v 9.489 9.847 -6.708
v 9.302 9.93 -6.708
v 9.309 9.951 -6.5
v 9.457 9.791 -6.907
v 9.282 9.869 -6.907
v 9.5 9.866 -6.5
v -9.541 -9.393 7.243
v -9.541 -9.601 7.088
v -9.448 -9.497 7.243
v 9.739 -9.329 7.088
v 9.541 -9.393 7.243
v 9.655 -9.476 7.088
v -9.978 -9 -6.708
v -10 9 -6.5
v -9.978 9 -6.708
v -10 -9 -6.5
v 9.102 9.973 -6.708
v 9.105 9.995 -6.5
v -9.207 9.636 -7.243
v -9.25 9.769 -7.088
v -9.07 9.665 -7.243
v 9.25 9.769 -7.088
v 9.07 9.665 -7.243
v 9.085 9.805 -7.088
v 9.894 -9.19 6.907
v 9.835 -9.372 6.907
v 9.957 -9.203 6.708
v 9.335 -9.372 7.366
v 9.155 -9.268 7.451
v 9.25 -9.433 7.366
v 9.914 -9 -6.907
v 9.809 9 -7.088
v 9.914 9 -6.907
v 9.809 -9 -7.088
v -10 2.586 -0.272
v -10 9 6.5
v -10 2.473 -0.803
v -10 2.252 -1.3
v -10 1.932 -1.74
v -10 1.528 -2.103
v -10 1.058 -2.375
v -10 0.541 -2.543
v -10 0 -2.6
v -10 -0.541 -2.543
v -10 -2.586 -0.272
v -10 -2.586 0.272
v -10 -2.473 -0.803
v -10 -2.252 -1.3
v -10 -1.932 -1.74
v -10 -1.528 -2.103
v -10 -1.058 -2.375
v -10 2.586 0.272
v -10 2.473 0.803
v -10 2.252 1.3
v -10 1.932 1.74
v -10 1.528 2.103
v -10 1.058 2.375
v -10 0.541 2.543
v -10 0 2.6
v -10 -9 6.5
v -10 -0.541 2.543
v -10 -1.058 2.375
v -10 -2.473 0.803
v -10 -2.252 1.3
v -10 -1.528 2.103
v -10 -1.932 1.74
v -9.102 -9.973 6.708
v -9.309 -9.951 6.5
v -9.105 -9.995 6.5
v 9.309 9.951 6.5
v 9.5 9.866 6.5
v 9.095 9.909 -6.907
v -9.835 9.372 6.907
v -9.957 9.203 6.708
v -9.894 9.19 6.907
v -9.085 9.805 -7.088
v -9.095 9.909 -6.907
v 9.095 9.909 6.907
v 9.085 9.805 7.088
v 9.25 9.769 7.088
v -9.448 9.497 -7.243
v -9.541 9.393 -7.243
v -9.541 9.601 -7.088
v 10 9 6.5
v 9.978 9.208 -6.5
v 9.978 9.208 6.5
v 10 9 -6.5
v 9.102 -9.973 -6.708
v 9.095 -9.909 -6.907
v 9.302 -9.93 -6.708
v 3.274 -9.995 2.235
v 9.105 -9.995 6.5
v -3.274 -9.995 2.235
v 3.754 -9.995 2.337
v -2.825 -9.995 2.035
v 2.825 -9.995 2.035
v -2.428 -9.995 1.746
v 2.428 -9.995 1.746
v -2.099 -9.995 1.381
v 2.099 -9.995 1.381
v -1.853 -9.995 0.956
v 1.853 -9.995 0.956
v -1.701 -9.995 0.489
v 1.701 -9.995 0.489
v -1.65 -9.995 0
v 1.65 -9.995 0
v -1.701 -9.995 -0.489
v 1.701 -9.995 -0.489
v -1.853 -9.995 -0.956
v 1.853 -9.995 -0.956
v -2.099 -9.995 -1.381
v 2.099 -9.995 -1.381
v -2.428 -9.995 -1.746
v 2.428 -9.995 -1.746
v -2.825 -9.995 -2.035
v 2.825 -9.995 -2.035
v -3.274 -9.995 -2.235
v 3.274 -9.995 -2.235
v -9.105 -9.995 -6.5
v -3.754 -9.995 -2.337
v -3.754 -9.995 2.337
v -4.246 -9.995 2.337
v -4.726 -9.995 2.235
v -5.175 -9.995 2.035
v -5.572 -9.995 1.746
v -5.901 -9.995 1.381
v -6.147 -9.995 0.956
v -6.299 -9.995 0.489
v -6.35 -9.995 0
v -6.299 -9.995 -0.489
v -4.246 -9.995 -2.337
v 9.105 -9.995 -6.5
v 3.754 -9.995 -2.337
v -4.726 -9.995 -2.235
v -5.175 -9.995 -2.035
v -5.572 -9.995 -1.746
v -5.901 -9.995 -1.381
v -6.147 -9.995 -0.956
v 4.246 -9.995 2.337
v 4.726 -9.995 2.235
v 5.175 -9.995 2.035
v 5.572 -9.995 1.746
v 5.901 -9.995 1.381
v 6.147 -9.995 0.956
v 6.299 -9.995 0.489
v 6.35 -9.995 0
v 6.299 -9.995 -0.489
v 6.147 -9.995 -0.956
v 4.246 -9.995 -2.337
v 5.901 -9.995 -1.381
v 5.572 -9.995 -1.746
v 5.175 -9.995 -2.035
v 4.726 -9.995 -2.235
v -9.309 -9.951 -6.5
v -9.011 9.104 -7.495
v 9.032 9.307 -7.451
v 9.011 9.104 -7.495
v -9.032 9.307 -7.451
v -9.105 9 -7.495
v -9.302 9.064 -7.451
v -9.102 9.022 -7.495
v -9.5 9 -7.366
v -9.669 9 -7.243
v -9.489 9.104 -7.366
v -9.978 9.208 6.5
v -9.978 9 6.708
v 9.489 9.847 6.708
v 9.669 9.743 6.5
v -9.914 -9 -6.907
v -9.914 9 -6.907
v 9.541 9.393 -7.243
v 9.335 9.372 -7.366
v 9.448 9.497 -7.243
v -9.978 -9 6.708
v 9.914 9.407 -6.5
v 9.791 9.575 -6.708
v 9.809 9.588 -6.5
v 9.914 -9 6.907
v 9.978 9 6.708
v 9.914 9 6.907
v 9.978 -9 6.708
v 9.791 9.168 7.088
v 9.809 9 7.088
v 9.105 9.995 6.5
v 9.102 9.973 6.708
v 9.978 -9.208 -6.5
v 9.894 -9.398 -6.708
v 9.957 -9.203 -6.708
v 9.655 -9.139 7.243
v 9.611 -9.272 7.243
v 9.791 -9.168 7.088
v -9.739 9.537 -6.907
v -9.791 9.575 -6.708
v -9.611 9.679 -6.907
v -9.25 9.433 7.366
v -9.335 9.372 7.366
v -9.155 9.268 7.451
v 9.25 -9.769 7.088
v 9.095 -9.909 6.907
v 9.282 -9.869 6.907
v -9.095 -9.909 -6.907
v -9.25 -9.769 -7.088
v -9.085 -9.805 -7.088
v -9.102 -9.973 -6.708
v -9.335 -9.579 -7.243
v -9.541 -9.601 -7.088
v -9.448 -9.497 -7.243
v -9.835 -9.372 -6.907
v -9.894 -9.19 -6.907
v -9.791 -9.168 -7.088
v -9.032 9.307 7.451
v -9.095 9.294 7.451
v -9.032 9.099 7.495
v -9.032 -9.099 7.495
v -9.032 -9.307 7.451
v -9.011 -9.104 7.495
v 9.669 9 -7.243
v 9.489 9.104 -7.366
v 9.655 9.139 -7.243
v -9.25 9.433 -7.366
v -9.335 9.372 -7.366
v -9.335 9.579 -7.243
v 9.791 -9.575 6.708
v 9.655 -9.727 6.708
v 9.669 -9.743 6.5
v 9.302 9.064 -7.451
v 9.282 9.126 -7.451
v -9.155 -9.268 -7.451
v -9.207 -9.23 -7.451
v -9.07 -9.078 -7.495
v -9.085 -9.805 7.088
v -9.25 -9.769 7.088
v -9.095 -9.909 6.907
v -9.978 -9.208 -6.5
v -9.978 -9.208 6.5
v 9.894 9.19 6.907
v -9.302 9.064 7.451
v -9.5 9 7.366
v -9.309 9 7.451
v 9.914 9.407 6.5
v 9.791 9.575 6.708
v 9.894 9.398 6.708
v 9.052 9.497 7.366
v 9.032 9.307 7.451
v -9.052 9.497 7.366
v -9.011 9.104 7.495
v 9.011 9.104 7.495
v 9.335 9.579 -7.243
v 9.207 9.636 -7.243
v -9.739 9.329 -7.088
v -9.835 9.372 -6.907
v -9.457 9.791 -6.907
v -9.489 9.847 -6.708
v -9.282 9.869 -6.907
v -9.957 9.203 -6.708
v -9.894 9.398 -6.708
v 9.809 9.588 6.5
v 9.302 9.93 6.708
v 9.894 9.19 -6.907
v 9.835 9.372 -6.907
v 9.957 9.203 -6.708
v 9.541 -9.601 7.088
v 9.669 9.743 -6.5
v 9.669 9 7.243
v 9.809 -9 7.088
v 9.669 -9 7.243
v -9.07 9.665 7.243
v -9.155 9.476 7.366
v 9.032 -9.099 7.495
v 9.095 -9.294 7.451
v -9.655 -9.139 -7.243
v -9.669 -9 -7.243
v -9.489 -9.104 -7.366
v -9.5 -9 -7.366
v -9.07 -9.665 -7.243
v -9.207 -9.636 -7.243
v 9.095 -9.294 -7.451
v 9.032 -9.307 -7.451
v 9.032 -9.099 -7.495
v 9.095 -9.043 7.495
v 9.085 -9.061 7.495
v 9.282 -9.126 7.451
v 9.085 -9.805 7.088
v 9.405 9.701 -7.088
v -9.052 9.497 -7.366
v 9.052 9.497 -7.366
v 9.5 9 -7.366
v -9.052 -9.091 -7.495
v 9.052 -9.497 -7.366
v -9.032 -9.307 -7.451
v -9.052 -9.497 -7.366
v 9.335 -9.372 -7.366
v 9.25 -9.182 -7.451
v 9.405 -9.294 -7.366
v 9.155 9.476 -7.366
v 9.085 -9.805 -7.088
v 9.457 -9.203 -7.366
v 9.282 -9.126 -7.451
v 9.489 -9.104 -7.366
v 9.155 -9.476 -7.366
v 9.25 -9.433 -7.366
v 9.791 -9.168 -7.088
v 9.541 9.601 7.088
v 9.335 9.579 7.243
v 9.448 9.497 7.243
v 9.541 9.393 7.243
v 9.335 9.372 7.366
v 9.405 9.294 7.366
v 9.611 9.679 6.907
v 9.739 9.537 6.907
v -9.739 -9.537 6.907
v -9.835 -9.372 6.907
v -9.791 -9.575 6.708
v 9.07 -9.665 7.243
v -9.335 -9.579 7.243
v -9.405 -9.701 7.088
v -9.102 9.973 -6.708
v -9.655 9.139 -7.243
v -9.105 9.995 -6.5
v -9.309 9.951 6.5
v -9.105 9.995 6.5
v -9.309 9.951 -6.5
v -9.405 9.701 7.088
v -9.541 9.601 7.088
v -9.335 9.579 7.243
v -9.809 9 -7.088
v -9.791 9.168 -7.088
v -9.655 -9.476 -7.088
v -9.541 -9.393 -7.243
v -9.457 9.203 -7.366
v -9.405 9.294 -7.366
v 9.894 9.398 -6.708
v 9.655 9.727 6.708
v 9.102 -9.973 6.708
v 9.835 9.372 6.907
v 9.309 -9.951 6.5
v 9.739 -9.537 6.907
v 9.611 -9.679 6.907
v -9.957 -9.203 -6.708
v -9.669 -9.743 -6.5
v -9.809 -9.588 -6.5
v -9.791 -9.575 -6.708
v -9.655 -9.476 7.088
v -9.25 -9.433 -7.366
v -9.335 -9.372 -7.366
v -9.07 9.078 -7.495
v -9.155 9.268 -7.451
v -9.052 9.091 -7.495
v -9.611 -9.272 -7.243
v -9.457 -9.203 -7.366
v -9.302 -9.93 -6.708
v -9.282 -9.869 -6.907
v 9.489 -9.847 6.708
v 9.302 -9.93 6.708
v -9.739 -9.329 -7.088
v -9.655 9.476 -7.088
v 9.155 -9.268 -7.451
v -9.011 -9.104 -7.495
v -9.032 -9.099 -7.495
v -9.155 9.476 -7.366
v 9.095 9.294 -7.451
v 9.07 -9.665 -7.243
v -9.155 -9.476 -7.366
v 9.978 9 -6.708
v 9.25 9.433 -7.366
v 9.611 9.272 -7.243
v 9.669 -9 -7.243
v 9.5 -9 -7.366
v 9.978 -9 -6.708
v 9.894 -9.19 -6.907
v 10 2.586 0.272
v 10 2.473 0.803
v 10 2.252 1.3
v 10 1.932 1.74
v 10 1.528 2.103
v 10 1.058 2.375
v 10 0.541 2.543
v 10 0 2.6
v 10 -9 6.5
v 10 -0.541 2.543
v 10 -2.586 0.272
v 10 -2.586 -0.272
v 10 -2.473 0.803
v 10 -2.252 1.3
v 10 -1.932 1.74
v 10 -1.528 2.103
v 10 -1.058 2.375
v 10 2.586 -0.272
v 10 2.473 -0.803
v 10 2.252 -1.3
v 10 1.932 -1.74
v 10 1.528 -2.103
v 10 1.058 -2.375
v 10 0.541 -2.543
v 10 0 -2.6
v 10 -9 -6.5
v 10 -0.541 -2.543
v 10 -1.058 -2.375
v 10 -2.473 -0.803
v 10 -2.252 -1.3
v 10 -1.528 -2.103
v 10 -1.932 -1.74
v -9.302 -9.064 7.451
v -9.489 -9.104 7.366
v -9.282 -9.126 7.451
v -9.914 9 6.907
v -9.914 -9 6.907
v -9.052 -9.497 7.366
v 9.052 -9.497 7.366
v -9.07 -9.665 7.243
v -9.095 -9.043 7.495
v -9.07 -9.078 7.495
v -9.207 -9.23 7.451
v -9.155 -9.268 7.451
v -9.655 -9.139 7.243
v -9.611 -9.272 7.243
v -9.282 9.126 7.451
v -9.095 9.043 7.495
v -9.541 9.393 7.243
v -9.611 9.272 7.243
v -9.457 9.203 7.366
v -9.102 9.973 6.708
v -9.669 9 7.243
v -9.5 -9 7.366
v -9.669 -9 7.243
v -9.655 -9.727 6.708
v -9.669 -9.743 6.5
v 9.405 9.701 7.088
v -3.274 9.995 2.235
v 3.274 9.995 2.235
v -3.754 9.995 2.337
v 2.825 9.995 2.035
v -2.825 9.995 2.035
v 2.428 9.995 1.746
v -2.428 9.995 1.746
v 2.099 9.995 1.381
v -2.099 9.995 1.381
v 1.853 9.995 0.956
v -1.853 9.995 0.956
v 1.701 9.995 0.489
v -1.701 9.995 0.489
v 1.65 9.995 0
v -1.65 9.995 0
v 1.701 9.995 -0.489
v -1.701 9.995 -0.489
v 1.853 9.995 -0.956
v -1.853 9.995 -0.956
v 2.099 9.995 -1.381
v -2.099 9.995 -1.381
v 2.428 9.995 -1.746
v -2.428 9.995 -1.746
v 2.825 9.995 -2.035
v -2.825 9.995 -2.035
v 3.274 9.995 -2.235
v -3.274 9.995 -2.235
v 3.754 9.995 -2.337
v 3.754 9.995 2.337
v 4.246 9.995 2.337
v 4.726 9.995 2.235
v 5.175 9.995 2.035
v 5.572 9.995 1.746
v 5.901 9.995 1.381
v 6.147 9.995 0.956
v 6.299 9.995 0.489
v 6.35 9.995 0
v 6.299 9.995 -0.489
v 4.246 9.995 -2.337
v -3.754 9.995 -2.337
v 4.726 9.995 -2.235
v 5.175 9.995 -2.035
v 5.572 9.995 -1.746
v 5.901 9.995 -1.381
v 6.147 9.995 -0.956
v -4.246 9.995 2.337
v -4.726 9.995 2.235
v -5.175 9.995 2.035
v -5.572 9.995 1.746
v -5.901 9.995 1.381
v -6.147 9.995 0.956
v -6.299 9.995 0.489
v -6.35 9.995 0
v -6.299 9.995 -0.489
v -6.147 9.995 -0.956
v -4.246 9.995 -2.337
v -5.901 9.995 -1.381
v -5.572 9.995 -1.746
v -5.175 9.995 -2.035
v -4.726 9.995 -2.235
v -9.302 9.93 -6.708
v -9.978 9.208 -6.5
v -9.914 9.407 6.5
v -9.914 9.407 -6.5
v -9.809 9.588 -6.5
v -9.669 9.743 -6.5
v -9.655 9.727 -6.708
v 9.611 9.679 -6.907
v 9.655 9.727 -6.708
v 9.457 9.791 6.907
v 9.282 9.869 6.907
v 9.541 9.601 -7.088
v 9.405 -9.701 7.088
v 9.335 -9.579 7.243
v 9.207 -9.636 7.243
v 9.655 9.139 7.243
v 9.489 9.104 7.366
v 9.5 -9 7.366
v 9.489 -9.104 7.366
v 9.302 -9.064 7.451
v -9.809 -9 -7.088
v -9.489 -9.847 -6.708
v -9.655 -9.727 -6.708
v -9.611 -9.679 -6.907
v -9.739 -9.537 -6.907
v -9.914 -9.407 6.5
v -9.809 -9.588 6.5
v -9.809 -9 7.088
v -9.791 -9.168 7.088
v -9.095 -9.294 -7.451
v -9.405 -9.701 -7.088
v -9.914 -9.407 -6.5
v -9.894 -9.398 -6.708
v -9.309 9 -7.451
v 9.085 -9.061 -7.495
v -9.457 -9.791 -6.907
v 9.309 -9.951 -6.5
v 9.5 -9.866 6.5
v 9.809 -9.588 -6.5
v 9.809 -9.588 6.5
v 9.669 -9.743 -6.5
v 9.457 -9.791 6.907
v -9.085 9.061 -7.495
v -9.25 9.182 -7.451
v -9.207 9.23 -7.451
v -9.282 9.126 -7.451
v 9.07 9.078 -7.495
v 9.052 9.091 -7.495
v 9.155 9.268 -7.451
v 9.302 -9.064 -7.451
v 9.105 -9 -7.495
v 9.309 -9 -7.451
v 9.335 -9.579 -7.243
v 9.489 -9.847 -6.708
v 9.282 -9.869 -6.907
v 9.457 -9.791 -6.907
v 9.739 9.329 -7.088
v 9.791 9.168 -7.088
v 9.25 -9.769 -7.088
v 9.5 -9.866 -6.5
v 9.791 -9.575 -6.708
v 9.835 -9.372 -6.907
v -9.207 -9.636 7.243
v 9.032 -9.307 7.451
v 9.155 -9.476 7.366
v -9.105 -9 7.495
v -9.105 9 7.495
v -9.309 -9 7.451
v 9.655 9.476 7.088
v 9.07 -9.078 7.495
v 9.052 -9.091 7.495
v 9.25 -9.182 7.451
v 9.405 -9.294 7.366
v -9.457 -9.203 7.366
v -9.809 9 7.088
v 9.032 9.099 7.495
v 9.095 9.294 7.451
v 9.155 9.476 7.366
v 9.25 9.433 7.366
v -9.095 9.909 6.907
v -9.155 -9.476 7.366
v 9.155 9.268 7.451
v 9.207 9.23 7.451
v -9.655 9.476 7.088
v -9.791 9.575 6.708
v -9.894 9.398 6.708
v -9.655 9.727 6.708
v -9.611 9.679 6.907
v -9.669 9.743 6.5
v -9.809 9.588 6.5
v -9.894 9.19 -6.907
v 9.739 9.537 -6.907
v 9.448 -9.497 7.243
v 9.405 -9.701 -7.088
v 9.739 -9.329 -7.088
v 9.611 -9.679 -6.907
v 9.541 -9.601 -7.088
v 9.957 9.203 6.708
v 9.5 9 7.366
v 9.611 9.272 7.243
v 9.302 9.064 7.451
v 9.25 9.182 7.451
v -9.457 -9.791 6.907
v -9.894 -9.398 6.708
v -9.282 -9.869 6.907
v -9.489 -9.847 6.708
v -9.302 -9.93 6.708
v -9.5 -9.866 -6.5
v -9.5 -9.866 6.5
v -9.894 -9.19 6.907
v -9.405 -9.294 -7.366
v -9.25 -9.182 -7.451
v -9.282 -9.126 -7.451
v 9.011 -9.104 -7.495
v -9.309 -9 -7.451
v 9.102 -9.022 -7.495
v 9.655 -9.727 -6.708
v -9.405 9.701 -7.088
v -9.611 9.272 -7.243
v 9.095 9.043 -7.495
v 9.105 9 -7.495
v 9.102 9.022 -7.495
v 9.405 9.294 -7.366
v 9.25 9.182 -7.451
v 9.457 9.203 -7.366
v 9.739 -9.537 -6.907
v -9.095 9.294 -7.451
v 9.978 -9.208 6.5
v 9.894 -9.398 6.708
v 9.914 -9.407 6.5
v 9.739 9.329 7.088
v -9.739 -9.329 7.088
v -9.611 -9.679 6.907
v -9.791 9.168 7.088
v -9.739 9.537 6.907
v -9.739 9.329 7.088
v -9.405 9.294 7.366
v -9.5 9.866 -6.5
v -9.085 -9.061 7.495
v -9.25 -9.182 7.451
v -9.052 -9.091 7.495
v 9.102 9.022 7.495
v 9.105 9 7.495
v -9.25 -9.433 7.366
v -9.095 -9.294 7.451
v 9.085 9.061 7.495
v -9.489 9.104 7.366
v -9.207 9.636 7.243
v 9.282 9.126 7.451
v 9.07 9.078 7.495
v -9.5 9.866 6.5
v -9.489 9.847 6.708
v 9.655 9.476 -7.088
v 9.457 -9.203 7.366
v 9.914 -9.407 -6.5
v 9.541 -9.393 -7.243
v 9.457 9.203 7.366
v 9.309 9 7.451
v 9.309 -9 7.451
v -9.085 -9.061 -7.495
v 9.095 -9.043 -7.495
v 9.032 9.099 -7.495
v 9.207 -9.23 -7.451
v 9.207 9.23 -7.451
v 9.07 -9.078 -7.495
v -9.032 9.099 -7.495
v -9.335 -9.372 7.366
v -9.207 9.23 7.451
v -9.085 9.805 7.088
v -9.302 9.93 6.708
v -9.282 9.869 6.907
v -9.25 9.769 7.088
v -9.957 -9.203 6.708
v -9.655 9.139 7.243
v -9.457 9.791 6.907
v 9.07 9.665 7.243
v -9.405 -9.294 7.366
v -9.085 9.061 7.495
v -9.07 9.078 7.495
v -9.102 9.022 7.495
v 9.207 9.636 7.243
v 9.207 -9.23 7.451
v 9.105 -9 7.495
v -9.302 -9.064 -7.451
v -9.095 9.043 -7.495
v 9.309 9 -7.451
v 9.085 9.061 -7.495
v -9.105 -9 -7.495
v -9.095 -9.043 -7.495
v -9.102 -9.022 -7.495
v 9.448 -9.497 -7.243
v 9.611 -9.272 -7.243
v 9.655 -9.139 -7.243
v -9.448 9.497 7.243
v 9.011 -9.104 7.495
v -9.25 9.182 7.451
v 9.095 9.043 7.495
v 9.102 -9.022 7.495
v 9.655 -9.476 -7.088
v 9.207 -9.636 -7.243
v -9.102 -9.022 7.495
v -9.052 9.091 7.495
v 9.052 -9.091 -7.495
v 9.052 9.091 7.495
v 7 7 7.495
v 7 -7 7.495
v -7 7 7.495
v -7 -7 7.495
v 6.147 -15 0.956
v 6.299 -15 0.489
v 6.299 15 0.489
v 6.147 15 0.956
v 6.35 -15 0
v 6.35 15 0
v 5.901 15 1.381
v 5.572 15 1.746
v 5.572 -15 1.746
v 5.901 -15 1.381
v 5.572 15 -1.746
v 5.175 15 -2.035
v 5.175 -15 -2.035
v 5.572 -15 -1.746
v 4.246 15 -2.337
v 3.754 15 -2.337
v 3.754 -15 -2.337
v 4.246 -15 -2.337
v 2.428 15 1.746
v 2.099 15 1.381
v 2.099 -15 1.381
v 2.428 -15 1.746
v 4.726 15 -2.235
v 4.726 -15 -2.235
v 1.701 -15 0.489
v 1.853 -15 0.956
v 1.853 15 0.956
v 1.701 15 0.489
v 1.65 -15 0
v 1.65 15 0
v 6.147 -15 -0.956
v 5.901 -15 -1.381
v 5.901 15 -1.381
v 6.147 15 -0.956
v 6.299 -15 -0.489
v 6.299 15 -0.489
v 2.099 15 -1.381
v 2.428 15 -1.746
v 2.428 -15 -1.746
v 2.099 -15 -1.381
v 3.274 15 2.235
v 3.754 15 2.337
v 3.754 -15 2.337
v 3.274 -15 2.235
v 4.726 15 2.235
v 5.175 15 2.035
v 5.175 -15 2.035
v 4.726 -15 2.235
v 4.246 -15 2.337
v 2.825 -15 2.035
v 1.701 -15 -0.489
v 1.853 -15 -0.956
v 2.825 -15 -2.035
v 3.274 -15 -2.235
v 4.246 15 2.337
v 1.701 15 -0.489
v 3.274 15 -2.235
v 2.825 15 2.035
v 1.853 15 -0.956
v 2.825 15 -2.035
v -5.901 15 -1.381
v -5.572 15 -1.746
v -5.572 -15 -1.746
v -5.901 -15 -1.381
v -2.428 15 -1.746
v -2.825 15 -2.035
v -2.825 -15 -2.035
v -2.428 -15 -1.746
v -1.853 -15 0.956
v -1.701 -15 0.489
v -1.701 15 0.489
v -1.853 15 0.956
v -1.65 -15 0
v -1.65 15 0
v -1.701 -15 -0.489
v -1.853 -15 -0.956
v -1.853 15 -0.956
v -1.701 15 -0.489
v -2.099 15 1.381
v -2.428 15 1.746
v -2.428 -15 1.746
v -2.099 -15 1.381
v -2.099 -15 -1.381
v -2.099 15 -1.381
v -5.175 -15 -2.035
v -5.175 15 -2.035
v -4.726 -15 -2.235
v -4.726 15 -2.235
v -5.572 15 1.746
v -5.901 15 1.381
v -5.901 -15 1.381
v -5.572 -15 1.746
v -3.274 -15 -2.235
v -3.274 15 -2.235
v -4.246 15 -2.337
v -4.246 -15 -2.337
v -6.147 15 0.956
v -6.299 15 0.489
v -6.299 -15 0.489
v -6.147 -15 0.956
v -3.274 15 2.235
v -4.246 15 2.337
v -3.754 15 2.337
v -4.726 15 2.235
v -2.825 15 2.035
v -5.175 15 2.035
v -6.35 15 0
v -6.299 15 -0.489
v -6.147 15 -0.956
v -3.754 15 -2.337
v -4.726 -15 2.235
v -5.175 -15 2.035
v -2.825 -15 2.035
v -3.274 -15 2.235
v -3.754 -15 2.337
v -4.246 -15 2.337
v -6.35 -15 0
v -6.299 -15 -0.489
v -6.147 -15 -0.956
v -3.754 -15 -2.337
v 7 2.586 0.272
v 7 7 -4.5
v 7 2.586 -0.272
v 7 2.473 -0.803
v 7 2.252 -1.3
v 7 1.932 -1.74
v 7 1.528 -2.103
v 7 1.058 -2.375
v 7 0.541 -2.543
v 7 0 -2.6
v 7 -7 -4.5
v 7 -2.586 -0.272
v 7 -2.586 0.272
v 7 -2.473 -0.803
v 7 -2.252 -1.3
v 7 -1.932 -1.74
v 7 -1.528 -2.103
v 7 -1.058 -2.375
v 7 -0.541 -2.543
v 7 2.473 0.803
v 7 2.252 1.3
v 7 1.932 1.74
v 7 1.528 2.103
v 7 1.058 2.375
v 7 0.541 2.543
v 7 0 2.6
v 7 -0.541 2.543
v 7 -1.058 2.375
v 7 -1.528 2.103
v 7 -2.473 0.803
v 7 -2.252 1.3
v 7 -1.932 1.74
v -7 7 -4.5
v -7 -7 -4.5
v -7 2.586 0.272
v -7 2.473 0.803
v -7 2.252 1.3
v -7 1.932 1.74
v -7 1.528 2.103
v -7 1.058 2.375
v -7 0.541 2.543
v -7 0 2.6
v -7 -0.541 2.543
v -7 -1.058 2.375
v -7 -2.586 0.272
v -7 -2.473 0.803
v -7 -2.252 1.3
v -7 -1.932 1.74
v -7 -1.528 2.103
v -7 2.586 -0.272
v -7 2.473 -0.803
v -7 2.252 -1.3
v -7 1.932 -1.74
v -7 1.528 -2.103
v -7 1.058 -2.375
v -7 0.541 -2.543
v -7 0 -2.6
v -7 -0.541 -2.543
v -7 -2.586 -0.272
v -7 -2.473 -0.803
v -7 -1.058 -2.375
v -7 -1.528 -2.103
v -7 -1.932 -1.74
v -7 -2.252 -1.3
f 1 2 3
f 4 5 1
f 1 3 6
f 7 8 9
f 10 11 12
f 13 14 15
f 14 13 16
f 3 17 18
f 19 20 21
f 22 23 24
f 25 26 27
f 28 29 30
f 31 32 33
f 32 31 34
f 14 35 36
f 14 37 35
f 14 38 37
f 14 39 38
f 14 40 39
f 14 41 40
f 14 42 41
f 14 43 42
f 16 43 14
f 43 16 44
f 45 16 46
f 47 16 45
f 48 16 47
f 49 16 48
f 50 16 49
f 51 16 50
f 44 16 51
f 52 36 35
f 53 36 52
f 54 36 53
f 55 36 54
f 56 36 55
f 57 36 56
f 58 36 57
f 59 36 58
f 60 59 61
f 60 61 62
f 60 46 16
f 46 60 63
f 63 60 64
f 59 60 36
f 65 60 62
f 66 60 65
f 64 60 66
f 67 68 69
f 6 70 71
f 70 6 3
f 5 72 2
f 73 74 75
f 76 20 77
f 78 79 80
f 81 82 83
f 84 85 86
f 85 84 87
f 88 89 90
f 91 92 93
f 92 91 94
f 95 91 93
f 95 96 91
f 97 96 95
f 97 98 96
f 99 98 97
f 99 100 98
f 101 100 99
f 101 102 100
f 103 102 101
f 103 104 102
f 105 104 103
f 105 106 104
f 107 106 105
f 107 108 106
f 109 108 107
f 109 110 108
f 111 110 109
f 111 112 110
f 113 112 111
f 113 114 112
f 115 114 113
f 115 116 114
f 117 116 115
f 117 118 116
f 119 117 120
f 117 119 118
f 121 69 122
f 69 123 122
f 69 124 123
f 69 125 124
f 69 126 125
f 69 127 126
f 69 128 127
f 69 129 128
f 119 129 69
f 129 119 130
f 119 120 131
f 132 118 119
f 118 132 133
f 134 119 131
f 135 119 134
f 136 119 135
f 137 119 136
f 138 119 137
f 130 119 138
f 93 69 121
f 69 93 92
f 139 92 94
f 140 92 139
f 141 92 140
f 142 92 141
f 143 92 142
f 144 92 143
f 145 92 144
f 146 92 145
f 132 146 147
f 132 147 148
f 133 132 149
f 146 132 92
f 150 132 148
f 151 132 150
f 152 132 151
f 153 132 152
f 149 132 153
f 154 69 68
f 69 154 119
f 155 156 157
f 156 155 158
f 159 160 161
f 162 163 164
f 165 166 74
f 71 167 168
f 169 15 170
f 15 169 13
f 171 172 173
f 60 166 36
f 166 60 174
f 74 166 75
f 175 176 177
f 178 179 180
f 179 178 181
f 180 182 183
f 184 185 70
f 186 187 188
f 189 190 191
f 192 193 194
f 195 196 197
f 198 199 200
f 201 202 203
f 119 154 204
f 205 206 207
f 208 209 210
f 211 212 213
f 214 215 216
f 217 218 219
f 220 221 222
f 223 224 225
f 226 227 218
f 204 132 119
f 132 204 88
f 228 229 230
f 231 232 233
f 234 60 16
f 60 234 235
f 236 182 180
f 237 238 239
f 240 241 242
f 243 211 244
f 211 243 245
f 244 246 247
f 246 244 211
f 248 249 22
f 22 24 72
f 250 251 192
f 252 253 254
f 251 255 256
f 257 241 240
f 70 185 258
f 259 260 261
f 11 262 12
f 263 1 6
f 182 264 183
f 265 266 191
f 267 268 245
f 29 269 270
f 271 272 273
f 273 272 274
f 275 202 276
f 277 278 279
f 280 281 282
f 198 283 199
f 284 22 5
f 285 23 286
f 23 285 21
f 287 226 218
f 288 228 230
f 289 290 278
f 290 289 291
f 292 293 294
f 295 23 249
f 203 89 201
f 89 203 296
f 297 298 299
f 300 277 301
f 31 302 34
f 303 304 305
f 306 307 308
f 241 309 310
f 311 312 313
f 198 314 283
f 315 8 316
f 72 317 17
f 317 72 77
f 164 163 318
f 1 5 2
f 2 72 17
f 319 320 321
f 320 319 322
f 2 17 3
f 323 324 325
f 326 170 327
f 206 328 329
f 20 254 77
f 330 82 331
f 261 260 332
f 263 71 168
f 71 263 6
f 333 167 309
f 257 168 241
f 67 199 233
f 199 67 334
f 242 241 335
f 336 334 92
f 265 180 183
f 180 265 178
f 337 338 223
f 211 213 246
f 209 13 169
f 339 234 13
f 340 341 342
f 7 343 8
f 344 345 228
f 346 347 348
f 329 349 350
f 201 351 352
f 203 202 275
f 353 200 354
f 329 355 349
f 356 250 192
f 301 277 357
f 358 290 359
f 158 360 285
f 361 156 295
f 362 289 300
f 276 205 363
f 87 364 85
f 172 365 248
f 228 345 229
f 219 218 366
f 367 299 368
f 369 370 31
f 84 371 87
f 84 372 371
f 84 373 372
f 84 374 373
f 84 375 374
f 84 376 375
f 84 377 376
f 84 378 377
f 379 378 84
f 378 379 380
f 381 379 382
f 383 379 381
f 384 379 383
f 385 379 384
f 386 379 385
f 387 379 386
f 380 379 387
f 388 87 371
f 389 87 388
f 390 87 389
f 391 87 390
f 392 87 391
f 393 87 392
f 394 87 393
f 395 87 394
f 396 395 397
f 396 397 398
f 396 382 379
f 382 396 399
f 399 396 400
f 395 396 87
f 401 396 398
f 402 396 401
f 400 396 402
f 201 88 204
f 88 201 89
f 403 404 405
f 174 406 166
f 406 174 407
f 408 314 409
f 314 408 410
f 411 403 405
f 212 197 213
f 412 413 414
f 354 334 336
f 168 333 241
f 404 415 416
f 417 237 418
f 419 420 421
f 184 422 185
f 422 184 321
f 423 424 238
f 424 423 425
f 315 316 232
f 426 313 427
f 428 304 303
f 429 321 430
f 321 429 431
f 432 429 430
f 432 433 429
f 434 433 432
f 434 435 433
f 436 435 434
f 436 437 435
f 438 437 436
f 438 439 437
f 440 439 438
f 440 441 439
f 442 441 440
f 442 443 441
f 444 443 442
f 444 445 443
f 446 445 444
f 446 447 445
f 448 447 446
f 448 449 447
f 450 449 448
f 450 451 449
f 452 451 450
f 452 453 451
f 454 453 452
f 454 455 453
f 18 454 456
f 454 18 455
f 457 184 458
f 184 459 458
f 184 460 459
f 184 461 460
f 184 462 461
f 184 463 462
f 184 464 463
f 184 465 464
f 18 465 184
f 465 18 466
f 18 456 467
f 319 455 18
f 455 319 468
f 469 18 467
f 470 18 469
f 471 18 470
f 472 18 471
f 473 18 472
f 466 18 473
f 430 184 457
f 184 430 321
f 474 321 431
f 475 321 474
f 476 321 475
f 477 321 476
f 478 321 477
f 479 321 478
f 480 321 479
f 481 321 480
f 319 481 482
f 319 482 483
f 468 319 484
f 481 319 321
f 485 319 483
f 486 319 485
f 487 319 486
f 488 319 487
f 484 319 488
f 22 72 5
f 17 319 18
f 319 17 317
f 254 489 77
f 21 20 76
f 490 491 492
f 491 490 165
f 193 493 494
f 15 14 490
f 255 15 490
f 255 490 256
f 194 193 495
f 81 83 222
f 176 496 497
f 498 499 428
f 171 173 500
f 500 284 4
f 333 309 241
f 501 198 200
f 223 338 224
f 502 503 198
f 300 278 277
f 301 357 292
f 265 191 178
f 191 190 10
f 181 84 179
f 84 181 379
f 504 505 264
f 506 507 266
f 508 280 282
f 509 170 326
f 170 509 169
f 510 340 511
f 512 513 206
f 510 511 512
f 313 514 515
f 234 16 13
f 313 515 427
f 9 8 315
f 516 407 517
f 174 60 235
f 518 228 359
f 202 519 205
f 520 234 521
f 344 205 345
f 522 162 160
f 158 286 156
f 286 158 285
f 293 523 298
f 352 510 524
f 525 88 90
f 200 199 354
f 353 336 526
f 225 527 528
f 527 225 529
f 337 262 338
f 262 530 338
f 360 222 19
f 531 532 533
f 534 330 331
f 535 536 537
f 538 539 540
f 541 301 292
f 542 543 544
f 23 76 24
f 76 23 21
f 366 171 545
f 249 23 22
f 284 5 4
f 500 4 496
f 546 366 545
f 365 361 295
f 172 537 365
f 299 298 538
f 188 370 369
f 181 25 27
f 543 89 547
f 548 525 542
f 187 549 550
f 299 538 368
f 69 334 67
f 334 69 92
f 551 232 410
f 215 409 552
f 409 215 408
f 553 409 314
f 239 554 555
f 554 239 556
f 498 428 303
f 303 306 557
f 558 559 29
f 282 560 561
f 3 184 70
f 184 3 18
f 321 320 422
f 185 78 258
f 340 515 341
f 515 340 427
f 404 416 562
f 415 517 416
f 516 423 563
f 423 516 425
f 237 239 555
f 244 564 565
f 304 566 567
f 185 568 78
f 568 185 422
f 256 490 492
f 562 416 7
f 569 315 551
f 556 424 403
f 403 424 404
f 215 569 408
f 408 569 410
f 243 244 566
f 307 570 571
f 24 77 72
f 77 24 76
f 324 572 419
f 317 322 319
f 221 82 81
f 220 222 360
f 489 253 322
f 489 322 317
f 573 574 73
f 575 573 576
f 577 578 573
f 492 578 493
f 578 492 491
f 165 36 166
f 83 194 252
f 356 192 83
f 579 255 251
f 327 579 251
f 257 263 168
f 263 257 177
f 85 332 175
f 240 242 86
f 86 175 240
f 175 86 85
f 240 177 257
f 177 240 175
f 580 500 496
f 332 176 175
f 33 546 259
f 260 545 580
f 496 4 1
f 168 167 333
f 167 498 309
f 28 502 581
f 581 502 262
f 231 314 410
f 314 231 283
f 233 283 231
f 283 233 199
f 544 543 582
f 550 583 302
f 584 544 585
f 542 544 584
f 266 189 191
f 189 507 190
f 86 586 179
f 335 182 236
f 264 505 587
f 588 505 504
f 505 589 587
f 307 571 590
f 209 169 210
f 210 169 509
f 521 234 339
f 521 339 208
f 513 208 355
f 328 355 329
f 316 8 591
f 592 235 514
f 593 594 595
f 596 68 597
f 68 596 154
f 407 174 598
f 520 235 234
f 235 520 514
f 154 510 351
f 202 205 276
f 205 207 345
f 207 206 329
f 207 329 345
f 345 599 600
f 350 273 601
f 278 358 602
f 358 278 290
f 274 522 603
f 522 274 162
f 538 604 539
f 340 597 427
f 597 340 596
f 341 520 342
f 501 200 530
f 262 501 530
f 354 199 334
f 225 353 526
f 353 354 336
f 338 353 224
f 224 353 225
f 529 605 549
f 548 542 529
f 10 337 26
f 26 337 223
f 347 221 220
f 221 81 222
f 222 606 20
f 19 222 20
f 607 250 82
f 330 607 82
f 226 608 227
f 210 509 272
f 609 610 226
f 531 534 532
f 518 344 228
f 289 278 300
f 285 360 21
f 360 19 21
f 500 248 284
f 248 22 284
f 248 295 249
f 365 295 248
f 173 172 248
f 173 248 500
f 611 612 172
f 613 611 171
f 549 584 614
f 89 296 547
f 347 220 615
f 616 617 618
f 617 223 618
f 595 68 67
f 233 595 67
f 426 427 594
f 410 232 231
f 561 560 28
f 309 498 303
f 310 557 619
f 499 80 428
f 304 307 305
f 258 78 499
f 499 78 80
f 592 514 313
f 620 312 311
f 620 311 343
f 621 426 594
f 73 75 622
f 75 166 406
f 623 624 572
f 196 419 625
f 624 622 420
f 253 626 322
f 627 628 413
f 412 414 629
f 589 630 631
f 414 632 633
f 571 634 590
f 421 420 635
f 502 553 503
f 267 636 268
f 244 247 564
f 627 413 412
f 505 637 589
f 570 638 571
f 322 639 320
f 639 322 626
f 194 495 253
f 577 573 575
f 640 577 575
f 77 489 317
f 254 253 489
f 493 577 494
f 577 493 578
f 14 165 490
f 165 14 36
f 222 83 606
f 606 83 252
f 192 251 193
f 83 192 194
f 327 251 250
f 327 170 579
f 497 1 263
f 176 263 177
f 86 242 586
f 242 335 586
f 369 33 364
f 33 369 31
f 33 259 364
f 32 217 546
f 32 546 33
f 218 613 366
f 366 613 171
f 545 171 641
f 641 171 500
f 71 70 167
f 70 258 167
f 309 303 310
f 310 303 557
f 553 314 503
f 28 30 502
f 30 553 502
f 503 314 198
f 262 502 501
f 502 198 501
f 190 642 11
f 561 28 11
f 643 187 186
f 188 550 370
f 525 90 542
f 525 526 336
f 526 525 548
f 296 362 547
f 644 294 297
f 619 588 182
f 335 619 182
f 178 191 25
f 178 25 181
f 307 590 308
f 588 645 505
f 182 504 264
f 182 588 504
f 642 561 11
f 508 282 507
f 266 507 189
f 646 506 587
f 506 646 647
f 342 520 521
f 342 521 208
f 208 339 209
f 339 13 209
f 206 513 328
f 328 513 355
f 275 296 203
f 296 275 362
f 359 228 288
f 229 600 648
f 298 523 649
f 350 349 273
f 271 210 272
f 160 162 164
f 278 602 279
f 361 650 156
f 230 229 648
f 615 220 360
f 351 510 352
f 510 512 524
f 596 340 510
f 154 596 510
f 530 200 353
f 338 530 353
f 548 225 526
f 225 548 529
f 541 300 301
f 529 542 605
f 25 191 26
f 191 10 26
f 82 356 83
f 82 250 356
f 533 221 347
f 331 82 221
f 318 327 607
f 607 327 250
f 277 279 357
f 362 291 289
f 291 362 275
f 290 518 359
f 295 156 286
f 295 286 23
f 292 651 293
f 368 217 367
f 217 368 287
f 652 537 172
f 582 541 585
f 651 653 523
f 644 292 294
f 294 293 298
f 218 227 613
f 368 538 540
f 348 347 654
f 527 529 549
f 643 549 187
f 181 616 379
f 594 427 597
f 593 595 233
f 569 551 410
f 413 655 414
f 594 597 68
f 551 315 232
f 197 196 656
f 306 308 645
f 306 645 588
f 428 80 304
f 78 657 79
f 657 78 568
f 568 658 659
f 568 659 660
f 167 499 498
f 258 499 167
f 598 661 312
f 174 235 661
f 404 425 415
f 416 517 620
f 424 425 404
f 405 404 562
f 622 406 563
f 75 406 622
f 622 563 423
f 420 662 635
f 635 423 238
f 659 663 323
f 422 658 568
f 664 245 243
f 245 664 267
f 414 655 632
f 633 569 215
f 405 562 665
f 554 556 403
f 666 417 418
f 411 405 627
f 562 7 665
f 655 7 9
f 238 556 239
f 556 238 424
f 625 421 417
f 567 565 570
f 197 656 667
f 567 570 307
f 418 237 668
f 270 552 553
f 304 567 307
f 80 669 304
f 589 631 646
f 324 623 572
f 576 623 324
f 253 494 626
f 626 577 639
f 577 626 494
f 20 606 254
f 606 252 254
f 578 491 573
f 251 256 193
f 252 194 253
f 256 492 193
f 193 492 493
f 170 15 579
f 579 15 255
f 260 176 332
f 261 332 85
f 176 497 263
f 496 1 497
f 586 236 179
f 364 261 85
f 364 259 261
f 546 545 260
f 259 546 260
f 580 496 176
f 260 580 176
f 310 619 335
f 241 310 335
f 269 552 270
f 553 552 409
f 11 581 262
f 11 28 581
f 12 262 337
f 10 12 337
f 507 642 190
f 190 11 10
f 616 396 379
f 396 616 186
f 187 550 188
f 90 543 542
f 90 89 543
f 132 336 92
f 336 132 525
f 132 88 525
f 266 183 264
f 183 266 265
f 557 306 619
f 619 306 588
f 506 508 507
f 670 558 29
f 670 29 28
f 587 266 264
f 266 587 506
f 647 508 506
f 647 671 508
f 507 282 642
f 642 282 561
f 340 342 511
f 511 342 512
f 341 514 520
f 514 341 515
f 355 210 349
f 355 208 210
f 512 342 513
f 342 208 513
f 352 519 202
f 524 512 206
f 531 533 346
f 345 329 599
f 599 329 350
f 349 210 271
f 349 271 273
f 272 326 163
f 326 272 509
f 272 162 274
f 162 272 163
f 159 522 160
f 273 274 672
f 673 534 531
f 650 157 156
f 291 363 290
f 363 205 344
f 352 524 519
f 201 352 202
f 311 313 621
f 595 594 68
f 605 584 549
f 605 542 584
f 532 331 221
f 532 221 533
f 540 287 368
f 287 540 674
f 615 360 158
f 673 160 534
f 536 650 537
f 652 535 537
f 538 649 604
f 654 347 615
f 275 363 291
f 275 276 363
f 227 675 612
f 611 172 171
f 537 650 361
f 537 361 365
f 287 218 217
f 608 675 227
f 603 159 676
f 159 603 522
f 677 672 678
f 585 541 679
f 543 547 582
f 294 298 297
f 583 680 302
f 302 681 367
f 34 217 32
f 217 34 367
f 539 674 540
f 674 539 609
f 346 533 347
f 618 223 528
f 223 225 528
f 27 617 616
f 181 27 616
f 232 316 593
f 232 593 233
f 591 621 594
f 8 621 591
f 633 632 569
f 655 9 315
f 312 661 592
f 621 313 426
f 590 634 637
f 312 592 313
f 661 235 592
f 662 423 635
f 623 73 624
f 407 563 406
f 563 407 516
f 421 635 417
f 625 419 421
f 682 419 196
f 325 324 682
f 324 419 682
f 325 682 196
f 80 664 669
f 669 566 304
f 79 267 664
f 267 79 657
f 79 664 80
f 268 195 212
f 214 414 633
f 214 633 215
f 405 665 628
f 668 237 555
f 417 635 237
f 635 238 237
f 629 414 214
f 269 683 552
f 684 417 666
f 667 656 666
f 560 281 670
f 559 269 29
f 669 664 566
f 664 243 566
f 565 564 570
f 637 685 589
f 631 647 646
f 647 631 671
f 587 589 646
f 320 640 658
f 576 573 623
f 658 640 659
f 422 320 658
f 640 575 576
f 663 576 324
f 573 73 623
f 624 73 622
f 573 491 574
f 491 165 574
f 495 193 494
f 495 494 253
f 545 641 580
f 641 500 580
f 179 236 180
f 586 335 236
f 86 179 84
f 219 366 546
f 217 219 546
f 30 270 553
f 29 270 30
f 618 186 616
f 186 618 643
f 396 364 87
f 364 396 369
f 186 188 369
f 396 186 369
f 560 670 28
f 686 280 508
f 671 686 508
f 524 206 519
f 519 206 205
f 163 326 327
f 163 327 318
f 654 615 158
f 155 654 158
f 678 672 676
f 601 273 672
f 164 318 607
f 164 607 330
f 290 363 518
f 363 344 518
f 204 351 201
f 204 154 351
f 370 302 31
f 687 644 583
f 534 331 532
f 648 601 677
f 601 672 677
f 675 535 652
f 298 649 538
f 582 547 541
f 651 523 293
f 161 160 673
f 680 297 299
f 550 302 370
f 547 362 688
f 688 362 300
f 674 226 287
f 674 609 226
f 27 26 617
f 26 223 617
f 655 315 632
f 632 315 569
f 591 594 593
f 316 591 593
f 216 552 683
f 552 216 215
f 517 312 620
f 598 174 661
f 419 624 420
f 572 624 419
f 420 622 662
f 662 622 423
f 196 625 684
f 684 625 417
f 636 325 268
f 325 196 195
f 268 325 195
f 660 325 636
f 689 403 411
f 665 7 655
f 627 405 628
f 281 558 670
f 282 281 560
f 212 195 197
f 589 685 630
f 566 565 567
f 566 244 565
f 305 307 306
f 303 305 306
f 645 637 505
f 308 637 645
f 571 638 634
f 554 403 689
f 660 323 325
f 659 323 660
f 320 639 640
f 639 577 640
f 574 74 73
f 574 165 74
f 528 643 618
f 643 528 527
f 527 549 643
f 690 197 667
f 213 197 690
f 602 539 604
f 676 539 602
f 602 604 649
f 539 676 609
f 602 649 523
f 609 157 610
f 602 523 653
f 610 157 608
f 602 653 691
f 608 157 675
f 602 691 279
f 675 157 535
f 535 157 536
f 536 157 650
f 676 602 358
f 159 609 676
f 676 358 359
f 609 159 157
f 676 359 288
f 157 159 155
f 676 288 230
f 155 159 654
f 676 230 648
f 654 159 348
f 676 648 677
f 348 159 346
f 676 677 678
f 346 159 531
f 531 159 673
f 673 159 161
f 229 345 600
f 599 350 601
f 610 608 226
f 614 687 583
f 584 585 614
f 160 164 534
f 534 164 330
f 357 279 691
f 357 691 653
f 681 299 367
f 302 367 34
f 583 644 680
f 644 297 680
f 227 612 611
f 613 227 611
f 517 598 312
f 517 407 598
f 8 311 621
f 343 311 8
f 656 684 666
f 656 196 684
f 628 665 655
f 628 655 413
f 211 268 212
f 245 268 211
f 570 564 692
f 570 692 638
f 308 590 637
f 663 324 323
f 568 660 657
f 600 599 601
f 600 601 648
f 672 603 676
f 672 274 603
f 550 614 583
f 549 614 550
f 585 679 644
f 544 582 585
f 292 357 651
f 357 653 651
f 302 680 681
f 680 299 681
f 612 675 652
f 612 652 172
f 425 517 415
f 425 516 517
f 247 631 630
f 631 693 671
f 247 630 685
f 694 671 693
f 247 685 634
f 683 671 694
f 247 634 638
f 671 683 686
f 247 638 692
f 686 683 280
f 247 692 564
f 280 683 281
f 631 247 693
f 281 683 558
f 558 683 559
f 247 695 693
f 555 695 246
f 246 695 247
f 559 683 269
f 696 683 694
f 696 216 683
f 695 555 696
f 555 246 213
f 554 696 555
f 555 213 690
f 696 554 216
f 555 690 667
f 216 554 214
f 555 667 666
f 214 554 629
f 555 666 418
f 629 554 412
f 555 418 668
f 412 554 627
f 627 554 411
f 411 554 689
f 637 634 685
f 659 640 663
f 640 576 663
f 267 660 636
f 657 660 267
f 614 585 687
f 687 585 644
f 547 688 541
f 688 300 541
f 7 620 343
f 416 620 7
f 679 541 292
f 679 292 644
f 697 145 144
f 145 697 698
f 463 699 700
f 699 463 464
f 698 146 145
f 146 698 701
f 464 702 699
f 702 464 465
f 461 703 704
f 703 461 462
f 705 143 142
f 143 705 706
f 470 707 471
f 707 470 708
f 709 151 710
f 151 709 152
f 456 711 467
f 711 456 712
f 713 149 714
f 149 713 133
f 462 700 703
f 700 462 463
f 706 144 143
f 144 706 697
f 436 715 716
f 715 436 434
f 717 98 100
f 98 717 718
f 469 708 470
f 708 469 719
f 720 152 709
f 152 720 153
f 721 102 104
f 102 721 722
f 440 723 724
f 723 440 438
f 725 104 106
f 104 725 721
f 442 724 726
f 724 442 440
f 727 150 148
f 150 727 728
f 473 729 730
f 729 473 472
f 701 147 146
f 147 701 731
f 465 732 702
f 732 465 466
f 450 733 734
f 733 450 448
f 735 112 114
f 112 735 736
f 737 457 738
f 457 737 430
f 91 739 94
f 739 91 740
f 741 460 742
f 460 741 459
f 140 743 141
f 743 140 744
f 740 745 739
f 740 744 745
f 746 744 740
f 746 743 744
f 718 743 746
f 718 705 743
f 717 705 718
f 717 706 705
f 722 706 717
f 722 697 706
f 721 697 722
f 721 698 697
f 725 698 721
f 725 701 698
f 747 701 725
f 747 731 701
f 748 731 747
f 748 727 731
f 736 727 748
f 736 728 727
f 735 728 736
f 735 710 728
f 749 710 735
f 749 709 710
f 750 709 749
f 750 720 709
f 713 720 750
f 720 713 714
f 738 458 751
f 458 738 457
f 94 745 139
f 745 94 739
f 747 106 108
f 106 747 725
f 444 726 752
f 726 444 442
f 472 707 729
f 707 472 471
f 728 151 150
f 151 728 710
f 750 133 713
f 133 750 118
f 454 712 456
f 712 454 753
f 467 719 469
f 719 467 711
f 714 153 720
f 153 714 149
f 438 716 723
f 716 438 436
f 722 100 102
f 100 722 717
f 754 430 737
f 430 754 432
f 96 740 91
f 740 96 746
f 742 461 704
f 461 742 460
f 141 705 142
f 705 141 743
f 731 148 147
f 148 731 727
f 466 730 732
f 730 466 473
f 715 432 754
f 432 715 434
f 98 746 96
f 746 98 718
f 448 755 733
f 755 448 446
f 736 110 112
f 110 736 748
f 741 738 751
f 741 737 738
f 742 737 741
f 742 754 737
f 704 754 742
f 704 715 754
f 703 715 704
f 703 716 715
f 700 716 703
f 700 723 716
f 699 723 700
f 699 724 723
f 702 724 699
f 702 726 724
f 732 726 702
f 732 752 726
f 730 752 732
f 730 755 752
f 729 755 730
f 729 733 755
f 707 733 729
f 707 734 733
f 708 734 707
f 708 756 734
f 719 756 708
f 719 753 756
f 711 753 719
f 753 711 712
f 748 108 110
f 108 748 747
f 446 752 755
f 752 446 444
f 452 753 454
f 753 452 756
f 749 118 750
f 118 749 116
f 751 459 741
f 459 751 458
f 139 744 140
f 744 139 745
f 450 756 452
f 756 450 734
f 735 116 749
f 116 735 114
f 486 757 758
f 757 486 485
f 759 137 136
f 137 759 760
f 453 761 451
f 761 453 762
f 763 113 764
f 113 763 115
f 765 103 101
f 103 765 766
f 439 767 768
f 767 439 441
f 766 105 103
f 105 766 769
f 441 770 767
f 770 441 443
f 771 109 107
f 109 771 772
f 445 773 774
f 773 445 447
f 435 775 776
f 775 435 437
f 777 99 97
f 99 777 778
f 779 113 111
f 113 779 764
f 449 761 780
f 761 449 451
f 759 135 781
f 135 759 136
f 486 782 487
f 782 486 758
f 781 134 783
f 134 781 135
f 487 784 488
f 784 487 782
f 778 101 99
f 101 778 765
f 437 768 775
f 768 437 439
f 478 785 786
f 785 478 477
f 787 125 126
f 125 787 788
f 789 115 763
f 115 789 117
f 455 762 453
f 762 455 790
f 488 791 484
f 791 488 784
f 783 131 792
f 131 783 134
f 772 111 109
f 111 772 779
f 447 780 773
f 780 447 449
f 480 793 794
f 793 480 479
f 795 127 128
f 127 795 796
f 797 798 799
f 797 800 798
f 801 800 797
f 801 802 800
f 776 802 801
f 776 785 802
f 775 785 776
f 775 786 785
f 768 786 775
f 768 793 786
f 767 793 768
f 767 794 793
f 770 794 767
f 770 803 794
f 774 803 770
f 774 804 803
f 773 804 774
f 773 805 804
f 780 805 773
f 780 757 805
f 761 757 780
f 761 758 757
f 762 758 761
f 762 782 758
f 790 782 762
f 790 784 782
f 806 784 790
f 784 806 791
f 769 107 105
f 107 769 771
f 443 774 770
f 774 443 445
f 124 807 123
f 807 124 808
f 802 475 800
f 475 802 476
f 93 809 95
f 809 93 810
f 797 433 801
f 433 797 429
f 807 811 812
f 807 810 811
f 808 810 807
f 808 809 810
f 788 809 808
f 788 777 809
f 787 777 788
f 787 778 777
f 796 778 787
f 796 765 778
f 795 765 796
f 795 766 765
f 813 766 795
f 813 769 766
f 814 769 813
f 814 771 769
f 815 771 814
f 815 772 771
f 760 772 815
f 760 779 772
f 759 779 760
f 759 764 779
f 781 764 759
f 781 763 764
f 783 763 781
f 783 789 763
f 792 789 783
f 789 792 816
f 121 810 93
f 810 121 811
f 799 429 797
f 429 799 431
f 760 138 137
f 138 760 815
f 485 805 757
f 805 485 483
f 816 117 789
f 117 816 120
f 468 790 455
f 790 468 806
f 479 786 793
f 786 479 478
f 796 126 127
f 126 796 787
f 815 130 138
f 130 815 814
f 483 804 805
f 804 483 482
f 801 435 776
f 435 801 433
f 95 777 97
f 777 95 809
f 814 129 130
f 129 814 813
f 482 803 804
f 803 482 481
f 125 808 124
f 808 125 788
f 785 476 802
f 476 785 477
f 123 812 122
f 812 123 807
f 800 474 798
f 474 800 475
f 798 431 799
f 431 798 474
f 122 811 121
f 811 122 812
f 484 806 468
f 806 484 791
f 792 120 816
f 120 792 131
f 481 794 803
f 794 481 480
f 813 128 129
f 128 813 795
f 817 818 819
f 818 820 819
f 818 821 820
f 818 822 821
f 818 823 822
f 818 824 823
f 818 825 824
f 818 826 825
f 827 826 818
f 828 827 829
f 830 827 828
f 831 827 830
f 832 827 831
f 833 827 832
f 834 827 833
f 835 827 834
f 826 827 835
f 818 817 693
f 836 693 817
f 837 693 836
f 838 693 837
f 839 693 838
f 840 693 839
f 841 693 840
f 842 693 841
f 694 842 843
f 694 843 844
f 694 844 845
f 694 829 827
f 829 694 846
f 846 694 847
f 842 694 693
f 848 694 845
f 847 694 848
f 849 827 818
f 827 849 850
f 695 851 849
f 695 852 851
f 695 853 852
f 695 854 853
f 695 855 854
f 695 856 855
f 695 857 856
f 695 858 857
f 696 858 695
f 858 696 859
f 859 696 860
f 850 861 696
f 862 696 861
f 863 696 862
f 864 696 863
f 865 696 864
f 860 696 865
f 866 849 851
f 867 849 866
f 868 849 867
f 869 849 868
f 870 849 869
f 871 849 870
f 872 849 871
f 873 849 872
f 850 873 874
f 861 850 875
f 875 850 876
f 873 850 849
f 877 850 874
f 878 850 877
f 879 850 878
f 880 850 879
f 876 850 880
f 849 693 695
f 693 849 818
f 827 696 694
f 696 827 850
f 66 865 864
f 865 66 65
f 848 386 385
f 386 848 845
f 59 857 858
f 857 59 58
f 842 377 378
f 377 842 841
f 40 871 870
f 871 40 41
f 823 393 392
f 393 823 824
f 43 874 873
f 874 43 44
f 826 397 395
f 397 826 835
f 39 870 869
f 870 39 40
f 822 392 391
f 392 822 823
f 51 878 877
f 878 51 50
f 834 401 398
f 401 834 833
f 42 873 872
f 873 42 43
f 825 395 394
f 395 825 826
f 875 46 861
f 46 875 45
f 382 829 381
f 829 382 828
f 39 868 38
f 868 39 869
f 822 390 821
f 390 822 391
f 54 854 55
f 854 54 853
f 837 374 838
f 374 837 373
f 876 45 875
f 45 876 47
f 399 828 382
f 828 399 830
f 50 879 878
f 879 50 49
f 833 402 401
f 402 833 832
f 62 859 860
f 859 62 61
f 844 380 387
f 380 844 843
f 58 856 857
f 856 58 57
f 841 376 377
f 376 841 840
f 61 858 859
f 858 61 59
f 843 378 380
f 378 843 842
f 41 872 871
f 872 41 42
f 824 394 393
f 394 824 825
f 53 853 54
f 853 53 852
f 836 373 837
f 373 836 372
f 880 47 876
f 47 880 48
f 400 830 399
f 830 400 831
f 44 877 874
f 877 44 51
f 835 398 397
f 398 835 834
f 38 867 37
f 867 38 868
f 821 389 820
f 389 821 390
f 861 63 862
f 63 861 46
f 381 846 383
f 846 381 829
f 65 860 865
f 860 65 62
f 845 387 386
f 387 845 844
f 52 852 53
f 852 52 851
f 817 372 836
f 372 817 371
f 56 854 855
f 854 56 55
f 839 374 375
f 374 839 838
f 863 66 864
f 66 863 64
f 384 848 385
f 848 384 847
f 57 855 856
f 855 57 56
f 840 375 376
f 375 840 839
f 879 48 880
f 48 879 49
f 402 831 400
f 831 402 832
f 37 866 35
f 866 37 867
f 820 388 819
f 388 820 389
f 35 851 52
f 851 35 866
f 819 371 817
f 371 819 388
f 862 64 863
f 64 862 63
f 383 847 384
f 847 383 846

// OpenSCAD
// Mini
//beam_width     = 4;
//hole_diameter  = 2.2;

// Standard
beam_width     = 8;
hole_diameter  = 5.1;
post_diameter = 4.7;

hole_radius = hole_diameter/2;
post_radius = post_diameter/2;

switch_size = 14;

switch_height = 12;

wiring_hole = 5.2;

difference() {
    union() {
        minkowski() {
            cube([2.5*beam_width-2, 2.5*beam_width-2, switch_height + 1], center=true);
            sphere(1, $fn=30);
        }

        translate([beam_width/2, 0, 0]) rotate([90,0,0]) cylinder(h = switch_size + 2*beam_width, r = post_radius, center = true, $fn=30);
        translate([-beam_width/2, 0, 0]) rotate([90,0,0]) cylinder(h = switch_size + 2*beam_width, r = post_radius, center = true, $fn=30);

    }
    translate([0,0,1.5]) cube([switch_size, switch_size, switch_height], center=true);
    rotate([0,90,0]) cylinder(h=2*switch_size, r=wiring_hole/2, center=true, $fn=30);
}
